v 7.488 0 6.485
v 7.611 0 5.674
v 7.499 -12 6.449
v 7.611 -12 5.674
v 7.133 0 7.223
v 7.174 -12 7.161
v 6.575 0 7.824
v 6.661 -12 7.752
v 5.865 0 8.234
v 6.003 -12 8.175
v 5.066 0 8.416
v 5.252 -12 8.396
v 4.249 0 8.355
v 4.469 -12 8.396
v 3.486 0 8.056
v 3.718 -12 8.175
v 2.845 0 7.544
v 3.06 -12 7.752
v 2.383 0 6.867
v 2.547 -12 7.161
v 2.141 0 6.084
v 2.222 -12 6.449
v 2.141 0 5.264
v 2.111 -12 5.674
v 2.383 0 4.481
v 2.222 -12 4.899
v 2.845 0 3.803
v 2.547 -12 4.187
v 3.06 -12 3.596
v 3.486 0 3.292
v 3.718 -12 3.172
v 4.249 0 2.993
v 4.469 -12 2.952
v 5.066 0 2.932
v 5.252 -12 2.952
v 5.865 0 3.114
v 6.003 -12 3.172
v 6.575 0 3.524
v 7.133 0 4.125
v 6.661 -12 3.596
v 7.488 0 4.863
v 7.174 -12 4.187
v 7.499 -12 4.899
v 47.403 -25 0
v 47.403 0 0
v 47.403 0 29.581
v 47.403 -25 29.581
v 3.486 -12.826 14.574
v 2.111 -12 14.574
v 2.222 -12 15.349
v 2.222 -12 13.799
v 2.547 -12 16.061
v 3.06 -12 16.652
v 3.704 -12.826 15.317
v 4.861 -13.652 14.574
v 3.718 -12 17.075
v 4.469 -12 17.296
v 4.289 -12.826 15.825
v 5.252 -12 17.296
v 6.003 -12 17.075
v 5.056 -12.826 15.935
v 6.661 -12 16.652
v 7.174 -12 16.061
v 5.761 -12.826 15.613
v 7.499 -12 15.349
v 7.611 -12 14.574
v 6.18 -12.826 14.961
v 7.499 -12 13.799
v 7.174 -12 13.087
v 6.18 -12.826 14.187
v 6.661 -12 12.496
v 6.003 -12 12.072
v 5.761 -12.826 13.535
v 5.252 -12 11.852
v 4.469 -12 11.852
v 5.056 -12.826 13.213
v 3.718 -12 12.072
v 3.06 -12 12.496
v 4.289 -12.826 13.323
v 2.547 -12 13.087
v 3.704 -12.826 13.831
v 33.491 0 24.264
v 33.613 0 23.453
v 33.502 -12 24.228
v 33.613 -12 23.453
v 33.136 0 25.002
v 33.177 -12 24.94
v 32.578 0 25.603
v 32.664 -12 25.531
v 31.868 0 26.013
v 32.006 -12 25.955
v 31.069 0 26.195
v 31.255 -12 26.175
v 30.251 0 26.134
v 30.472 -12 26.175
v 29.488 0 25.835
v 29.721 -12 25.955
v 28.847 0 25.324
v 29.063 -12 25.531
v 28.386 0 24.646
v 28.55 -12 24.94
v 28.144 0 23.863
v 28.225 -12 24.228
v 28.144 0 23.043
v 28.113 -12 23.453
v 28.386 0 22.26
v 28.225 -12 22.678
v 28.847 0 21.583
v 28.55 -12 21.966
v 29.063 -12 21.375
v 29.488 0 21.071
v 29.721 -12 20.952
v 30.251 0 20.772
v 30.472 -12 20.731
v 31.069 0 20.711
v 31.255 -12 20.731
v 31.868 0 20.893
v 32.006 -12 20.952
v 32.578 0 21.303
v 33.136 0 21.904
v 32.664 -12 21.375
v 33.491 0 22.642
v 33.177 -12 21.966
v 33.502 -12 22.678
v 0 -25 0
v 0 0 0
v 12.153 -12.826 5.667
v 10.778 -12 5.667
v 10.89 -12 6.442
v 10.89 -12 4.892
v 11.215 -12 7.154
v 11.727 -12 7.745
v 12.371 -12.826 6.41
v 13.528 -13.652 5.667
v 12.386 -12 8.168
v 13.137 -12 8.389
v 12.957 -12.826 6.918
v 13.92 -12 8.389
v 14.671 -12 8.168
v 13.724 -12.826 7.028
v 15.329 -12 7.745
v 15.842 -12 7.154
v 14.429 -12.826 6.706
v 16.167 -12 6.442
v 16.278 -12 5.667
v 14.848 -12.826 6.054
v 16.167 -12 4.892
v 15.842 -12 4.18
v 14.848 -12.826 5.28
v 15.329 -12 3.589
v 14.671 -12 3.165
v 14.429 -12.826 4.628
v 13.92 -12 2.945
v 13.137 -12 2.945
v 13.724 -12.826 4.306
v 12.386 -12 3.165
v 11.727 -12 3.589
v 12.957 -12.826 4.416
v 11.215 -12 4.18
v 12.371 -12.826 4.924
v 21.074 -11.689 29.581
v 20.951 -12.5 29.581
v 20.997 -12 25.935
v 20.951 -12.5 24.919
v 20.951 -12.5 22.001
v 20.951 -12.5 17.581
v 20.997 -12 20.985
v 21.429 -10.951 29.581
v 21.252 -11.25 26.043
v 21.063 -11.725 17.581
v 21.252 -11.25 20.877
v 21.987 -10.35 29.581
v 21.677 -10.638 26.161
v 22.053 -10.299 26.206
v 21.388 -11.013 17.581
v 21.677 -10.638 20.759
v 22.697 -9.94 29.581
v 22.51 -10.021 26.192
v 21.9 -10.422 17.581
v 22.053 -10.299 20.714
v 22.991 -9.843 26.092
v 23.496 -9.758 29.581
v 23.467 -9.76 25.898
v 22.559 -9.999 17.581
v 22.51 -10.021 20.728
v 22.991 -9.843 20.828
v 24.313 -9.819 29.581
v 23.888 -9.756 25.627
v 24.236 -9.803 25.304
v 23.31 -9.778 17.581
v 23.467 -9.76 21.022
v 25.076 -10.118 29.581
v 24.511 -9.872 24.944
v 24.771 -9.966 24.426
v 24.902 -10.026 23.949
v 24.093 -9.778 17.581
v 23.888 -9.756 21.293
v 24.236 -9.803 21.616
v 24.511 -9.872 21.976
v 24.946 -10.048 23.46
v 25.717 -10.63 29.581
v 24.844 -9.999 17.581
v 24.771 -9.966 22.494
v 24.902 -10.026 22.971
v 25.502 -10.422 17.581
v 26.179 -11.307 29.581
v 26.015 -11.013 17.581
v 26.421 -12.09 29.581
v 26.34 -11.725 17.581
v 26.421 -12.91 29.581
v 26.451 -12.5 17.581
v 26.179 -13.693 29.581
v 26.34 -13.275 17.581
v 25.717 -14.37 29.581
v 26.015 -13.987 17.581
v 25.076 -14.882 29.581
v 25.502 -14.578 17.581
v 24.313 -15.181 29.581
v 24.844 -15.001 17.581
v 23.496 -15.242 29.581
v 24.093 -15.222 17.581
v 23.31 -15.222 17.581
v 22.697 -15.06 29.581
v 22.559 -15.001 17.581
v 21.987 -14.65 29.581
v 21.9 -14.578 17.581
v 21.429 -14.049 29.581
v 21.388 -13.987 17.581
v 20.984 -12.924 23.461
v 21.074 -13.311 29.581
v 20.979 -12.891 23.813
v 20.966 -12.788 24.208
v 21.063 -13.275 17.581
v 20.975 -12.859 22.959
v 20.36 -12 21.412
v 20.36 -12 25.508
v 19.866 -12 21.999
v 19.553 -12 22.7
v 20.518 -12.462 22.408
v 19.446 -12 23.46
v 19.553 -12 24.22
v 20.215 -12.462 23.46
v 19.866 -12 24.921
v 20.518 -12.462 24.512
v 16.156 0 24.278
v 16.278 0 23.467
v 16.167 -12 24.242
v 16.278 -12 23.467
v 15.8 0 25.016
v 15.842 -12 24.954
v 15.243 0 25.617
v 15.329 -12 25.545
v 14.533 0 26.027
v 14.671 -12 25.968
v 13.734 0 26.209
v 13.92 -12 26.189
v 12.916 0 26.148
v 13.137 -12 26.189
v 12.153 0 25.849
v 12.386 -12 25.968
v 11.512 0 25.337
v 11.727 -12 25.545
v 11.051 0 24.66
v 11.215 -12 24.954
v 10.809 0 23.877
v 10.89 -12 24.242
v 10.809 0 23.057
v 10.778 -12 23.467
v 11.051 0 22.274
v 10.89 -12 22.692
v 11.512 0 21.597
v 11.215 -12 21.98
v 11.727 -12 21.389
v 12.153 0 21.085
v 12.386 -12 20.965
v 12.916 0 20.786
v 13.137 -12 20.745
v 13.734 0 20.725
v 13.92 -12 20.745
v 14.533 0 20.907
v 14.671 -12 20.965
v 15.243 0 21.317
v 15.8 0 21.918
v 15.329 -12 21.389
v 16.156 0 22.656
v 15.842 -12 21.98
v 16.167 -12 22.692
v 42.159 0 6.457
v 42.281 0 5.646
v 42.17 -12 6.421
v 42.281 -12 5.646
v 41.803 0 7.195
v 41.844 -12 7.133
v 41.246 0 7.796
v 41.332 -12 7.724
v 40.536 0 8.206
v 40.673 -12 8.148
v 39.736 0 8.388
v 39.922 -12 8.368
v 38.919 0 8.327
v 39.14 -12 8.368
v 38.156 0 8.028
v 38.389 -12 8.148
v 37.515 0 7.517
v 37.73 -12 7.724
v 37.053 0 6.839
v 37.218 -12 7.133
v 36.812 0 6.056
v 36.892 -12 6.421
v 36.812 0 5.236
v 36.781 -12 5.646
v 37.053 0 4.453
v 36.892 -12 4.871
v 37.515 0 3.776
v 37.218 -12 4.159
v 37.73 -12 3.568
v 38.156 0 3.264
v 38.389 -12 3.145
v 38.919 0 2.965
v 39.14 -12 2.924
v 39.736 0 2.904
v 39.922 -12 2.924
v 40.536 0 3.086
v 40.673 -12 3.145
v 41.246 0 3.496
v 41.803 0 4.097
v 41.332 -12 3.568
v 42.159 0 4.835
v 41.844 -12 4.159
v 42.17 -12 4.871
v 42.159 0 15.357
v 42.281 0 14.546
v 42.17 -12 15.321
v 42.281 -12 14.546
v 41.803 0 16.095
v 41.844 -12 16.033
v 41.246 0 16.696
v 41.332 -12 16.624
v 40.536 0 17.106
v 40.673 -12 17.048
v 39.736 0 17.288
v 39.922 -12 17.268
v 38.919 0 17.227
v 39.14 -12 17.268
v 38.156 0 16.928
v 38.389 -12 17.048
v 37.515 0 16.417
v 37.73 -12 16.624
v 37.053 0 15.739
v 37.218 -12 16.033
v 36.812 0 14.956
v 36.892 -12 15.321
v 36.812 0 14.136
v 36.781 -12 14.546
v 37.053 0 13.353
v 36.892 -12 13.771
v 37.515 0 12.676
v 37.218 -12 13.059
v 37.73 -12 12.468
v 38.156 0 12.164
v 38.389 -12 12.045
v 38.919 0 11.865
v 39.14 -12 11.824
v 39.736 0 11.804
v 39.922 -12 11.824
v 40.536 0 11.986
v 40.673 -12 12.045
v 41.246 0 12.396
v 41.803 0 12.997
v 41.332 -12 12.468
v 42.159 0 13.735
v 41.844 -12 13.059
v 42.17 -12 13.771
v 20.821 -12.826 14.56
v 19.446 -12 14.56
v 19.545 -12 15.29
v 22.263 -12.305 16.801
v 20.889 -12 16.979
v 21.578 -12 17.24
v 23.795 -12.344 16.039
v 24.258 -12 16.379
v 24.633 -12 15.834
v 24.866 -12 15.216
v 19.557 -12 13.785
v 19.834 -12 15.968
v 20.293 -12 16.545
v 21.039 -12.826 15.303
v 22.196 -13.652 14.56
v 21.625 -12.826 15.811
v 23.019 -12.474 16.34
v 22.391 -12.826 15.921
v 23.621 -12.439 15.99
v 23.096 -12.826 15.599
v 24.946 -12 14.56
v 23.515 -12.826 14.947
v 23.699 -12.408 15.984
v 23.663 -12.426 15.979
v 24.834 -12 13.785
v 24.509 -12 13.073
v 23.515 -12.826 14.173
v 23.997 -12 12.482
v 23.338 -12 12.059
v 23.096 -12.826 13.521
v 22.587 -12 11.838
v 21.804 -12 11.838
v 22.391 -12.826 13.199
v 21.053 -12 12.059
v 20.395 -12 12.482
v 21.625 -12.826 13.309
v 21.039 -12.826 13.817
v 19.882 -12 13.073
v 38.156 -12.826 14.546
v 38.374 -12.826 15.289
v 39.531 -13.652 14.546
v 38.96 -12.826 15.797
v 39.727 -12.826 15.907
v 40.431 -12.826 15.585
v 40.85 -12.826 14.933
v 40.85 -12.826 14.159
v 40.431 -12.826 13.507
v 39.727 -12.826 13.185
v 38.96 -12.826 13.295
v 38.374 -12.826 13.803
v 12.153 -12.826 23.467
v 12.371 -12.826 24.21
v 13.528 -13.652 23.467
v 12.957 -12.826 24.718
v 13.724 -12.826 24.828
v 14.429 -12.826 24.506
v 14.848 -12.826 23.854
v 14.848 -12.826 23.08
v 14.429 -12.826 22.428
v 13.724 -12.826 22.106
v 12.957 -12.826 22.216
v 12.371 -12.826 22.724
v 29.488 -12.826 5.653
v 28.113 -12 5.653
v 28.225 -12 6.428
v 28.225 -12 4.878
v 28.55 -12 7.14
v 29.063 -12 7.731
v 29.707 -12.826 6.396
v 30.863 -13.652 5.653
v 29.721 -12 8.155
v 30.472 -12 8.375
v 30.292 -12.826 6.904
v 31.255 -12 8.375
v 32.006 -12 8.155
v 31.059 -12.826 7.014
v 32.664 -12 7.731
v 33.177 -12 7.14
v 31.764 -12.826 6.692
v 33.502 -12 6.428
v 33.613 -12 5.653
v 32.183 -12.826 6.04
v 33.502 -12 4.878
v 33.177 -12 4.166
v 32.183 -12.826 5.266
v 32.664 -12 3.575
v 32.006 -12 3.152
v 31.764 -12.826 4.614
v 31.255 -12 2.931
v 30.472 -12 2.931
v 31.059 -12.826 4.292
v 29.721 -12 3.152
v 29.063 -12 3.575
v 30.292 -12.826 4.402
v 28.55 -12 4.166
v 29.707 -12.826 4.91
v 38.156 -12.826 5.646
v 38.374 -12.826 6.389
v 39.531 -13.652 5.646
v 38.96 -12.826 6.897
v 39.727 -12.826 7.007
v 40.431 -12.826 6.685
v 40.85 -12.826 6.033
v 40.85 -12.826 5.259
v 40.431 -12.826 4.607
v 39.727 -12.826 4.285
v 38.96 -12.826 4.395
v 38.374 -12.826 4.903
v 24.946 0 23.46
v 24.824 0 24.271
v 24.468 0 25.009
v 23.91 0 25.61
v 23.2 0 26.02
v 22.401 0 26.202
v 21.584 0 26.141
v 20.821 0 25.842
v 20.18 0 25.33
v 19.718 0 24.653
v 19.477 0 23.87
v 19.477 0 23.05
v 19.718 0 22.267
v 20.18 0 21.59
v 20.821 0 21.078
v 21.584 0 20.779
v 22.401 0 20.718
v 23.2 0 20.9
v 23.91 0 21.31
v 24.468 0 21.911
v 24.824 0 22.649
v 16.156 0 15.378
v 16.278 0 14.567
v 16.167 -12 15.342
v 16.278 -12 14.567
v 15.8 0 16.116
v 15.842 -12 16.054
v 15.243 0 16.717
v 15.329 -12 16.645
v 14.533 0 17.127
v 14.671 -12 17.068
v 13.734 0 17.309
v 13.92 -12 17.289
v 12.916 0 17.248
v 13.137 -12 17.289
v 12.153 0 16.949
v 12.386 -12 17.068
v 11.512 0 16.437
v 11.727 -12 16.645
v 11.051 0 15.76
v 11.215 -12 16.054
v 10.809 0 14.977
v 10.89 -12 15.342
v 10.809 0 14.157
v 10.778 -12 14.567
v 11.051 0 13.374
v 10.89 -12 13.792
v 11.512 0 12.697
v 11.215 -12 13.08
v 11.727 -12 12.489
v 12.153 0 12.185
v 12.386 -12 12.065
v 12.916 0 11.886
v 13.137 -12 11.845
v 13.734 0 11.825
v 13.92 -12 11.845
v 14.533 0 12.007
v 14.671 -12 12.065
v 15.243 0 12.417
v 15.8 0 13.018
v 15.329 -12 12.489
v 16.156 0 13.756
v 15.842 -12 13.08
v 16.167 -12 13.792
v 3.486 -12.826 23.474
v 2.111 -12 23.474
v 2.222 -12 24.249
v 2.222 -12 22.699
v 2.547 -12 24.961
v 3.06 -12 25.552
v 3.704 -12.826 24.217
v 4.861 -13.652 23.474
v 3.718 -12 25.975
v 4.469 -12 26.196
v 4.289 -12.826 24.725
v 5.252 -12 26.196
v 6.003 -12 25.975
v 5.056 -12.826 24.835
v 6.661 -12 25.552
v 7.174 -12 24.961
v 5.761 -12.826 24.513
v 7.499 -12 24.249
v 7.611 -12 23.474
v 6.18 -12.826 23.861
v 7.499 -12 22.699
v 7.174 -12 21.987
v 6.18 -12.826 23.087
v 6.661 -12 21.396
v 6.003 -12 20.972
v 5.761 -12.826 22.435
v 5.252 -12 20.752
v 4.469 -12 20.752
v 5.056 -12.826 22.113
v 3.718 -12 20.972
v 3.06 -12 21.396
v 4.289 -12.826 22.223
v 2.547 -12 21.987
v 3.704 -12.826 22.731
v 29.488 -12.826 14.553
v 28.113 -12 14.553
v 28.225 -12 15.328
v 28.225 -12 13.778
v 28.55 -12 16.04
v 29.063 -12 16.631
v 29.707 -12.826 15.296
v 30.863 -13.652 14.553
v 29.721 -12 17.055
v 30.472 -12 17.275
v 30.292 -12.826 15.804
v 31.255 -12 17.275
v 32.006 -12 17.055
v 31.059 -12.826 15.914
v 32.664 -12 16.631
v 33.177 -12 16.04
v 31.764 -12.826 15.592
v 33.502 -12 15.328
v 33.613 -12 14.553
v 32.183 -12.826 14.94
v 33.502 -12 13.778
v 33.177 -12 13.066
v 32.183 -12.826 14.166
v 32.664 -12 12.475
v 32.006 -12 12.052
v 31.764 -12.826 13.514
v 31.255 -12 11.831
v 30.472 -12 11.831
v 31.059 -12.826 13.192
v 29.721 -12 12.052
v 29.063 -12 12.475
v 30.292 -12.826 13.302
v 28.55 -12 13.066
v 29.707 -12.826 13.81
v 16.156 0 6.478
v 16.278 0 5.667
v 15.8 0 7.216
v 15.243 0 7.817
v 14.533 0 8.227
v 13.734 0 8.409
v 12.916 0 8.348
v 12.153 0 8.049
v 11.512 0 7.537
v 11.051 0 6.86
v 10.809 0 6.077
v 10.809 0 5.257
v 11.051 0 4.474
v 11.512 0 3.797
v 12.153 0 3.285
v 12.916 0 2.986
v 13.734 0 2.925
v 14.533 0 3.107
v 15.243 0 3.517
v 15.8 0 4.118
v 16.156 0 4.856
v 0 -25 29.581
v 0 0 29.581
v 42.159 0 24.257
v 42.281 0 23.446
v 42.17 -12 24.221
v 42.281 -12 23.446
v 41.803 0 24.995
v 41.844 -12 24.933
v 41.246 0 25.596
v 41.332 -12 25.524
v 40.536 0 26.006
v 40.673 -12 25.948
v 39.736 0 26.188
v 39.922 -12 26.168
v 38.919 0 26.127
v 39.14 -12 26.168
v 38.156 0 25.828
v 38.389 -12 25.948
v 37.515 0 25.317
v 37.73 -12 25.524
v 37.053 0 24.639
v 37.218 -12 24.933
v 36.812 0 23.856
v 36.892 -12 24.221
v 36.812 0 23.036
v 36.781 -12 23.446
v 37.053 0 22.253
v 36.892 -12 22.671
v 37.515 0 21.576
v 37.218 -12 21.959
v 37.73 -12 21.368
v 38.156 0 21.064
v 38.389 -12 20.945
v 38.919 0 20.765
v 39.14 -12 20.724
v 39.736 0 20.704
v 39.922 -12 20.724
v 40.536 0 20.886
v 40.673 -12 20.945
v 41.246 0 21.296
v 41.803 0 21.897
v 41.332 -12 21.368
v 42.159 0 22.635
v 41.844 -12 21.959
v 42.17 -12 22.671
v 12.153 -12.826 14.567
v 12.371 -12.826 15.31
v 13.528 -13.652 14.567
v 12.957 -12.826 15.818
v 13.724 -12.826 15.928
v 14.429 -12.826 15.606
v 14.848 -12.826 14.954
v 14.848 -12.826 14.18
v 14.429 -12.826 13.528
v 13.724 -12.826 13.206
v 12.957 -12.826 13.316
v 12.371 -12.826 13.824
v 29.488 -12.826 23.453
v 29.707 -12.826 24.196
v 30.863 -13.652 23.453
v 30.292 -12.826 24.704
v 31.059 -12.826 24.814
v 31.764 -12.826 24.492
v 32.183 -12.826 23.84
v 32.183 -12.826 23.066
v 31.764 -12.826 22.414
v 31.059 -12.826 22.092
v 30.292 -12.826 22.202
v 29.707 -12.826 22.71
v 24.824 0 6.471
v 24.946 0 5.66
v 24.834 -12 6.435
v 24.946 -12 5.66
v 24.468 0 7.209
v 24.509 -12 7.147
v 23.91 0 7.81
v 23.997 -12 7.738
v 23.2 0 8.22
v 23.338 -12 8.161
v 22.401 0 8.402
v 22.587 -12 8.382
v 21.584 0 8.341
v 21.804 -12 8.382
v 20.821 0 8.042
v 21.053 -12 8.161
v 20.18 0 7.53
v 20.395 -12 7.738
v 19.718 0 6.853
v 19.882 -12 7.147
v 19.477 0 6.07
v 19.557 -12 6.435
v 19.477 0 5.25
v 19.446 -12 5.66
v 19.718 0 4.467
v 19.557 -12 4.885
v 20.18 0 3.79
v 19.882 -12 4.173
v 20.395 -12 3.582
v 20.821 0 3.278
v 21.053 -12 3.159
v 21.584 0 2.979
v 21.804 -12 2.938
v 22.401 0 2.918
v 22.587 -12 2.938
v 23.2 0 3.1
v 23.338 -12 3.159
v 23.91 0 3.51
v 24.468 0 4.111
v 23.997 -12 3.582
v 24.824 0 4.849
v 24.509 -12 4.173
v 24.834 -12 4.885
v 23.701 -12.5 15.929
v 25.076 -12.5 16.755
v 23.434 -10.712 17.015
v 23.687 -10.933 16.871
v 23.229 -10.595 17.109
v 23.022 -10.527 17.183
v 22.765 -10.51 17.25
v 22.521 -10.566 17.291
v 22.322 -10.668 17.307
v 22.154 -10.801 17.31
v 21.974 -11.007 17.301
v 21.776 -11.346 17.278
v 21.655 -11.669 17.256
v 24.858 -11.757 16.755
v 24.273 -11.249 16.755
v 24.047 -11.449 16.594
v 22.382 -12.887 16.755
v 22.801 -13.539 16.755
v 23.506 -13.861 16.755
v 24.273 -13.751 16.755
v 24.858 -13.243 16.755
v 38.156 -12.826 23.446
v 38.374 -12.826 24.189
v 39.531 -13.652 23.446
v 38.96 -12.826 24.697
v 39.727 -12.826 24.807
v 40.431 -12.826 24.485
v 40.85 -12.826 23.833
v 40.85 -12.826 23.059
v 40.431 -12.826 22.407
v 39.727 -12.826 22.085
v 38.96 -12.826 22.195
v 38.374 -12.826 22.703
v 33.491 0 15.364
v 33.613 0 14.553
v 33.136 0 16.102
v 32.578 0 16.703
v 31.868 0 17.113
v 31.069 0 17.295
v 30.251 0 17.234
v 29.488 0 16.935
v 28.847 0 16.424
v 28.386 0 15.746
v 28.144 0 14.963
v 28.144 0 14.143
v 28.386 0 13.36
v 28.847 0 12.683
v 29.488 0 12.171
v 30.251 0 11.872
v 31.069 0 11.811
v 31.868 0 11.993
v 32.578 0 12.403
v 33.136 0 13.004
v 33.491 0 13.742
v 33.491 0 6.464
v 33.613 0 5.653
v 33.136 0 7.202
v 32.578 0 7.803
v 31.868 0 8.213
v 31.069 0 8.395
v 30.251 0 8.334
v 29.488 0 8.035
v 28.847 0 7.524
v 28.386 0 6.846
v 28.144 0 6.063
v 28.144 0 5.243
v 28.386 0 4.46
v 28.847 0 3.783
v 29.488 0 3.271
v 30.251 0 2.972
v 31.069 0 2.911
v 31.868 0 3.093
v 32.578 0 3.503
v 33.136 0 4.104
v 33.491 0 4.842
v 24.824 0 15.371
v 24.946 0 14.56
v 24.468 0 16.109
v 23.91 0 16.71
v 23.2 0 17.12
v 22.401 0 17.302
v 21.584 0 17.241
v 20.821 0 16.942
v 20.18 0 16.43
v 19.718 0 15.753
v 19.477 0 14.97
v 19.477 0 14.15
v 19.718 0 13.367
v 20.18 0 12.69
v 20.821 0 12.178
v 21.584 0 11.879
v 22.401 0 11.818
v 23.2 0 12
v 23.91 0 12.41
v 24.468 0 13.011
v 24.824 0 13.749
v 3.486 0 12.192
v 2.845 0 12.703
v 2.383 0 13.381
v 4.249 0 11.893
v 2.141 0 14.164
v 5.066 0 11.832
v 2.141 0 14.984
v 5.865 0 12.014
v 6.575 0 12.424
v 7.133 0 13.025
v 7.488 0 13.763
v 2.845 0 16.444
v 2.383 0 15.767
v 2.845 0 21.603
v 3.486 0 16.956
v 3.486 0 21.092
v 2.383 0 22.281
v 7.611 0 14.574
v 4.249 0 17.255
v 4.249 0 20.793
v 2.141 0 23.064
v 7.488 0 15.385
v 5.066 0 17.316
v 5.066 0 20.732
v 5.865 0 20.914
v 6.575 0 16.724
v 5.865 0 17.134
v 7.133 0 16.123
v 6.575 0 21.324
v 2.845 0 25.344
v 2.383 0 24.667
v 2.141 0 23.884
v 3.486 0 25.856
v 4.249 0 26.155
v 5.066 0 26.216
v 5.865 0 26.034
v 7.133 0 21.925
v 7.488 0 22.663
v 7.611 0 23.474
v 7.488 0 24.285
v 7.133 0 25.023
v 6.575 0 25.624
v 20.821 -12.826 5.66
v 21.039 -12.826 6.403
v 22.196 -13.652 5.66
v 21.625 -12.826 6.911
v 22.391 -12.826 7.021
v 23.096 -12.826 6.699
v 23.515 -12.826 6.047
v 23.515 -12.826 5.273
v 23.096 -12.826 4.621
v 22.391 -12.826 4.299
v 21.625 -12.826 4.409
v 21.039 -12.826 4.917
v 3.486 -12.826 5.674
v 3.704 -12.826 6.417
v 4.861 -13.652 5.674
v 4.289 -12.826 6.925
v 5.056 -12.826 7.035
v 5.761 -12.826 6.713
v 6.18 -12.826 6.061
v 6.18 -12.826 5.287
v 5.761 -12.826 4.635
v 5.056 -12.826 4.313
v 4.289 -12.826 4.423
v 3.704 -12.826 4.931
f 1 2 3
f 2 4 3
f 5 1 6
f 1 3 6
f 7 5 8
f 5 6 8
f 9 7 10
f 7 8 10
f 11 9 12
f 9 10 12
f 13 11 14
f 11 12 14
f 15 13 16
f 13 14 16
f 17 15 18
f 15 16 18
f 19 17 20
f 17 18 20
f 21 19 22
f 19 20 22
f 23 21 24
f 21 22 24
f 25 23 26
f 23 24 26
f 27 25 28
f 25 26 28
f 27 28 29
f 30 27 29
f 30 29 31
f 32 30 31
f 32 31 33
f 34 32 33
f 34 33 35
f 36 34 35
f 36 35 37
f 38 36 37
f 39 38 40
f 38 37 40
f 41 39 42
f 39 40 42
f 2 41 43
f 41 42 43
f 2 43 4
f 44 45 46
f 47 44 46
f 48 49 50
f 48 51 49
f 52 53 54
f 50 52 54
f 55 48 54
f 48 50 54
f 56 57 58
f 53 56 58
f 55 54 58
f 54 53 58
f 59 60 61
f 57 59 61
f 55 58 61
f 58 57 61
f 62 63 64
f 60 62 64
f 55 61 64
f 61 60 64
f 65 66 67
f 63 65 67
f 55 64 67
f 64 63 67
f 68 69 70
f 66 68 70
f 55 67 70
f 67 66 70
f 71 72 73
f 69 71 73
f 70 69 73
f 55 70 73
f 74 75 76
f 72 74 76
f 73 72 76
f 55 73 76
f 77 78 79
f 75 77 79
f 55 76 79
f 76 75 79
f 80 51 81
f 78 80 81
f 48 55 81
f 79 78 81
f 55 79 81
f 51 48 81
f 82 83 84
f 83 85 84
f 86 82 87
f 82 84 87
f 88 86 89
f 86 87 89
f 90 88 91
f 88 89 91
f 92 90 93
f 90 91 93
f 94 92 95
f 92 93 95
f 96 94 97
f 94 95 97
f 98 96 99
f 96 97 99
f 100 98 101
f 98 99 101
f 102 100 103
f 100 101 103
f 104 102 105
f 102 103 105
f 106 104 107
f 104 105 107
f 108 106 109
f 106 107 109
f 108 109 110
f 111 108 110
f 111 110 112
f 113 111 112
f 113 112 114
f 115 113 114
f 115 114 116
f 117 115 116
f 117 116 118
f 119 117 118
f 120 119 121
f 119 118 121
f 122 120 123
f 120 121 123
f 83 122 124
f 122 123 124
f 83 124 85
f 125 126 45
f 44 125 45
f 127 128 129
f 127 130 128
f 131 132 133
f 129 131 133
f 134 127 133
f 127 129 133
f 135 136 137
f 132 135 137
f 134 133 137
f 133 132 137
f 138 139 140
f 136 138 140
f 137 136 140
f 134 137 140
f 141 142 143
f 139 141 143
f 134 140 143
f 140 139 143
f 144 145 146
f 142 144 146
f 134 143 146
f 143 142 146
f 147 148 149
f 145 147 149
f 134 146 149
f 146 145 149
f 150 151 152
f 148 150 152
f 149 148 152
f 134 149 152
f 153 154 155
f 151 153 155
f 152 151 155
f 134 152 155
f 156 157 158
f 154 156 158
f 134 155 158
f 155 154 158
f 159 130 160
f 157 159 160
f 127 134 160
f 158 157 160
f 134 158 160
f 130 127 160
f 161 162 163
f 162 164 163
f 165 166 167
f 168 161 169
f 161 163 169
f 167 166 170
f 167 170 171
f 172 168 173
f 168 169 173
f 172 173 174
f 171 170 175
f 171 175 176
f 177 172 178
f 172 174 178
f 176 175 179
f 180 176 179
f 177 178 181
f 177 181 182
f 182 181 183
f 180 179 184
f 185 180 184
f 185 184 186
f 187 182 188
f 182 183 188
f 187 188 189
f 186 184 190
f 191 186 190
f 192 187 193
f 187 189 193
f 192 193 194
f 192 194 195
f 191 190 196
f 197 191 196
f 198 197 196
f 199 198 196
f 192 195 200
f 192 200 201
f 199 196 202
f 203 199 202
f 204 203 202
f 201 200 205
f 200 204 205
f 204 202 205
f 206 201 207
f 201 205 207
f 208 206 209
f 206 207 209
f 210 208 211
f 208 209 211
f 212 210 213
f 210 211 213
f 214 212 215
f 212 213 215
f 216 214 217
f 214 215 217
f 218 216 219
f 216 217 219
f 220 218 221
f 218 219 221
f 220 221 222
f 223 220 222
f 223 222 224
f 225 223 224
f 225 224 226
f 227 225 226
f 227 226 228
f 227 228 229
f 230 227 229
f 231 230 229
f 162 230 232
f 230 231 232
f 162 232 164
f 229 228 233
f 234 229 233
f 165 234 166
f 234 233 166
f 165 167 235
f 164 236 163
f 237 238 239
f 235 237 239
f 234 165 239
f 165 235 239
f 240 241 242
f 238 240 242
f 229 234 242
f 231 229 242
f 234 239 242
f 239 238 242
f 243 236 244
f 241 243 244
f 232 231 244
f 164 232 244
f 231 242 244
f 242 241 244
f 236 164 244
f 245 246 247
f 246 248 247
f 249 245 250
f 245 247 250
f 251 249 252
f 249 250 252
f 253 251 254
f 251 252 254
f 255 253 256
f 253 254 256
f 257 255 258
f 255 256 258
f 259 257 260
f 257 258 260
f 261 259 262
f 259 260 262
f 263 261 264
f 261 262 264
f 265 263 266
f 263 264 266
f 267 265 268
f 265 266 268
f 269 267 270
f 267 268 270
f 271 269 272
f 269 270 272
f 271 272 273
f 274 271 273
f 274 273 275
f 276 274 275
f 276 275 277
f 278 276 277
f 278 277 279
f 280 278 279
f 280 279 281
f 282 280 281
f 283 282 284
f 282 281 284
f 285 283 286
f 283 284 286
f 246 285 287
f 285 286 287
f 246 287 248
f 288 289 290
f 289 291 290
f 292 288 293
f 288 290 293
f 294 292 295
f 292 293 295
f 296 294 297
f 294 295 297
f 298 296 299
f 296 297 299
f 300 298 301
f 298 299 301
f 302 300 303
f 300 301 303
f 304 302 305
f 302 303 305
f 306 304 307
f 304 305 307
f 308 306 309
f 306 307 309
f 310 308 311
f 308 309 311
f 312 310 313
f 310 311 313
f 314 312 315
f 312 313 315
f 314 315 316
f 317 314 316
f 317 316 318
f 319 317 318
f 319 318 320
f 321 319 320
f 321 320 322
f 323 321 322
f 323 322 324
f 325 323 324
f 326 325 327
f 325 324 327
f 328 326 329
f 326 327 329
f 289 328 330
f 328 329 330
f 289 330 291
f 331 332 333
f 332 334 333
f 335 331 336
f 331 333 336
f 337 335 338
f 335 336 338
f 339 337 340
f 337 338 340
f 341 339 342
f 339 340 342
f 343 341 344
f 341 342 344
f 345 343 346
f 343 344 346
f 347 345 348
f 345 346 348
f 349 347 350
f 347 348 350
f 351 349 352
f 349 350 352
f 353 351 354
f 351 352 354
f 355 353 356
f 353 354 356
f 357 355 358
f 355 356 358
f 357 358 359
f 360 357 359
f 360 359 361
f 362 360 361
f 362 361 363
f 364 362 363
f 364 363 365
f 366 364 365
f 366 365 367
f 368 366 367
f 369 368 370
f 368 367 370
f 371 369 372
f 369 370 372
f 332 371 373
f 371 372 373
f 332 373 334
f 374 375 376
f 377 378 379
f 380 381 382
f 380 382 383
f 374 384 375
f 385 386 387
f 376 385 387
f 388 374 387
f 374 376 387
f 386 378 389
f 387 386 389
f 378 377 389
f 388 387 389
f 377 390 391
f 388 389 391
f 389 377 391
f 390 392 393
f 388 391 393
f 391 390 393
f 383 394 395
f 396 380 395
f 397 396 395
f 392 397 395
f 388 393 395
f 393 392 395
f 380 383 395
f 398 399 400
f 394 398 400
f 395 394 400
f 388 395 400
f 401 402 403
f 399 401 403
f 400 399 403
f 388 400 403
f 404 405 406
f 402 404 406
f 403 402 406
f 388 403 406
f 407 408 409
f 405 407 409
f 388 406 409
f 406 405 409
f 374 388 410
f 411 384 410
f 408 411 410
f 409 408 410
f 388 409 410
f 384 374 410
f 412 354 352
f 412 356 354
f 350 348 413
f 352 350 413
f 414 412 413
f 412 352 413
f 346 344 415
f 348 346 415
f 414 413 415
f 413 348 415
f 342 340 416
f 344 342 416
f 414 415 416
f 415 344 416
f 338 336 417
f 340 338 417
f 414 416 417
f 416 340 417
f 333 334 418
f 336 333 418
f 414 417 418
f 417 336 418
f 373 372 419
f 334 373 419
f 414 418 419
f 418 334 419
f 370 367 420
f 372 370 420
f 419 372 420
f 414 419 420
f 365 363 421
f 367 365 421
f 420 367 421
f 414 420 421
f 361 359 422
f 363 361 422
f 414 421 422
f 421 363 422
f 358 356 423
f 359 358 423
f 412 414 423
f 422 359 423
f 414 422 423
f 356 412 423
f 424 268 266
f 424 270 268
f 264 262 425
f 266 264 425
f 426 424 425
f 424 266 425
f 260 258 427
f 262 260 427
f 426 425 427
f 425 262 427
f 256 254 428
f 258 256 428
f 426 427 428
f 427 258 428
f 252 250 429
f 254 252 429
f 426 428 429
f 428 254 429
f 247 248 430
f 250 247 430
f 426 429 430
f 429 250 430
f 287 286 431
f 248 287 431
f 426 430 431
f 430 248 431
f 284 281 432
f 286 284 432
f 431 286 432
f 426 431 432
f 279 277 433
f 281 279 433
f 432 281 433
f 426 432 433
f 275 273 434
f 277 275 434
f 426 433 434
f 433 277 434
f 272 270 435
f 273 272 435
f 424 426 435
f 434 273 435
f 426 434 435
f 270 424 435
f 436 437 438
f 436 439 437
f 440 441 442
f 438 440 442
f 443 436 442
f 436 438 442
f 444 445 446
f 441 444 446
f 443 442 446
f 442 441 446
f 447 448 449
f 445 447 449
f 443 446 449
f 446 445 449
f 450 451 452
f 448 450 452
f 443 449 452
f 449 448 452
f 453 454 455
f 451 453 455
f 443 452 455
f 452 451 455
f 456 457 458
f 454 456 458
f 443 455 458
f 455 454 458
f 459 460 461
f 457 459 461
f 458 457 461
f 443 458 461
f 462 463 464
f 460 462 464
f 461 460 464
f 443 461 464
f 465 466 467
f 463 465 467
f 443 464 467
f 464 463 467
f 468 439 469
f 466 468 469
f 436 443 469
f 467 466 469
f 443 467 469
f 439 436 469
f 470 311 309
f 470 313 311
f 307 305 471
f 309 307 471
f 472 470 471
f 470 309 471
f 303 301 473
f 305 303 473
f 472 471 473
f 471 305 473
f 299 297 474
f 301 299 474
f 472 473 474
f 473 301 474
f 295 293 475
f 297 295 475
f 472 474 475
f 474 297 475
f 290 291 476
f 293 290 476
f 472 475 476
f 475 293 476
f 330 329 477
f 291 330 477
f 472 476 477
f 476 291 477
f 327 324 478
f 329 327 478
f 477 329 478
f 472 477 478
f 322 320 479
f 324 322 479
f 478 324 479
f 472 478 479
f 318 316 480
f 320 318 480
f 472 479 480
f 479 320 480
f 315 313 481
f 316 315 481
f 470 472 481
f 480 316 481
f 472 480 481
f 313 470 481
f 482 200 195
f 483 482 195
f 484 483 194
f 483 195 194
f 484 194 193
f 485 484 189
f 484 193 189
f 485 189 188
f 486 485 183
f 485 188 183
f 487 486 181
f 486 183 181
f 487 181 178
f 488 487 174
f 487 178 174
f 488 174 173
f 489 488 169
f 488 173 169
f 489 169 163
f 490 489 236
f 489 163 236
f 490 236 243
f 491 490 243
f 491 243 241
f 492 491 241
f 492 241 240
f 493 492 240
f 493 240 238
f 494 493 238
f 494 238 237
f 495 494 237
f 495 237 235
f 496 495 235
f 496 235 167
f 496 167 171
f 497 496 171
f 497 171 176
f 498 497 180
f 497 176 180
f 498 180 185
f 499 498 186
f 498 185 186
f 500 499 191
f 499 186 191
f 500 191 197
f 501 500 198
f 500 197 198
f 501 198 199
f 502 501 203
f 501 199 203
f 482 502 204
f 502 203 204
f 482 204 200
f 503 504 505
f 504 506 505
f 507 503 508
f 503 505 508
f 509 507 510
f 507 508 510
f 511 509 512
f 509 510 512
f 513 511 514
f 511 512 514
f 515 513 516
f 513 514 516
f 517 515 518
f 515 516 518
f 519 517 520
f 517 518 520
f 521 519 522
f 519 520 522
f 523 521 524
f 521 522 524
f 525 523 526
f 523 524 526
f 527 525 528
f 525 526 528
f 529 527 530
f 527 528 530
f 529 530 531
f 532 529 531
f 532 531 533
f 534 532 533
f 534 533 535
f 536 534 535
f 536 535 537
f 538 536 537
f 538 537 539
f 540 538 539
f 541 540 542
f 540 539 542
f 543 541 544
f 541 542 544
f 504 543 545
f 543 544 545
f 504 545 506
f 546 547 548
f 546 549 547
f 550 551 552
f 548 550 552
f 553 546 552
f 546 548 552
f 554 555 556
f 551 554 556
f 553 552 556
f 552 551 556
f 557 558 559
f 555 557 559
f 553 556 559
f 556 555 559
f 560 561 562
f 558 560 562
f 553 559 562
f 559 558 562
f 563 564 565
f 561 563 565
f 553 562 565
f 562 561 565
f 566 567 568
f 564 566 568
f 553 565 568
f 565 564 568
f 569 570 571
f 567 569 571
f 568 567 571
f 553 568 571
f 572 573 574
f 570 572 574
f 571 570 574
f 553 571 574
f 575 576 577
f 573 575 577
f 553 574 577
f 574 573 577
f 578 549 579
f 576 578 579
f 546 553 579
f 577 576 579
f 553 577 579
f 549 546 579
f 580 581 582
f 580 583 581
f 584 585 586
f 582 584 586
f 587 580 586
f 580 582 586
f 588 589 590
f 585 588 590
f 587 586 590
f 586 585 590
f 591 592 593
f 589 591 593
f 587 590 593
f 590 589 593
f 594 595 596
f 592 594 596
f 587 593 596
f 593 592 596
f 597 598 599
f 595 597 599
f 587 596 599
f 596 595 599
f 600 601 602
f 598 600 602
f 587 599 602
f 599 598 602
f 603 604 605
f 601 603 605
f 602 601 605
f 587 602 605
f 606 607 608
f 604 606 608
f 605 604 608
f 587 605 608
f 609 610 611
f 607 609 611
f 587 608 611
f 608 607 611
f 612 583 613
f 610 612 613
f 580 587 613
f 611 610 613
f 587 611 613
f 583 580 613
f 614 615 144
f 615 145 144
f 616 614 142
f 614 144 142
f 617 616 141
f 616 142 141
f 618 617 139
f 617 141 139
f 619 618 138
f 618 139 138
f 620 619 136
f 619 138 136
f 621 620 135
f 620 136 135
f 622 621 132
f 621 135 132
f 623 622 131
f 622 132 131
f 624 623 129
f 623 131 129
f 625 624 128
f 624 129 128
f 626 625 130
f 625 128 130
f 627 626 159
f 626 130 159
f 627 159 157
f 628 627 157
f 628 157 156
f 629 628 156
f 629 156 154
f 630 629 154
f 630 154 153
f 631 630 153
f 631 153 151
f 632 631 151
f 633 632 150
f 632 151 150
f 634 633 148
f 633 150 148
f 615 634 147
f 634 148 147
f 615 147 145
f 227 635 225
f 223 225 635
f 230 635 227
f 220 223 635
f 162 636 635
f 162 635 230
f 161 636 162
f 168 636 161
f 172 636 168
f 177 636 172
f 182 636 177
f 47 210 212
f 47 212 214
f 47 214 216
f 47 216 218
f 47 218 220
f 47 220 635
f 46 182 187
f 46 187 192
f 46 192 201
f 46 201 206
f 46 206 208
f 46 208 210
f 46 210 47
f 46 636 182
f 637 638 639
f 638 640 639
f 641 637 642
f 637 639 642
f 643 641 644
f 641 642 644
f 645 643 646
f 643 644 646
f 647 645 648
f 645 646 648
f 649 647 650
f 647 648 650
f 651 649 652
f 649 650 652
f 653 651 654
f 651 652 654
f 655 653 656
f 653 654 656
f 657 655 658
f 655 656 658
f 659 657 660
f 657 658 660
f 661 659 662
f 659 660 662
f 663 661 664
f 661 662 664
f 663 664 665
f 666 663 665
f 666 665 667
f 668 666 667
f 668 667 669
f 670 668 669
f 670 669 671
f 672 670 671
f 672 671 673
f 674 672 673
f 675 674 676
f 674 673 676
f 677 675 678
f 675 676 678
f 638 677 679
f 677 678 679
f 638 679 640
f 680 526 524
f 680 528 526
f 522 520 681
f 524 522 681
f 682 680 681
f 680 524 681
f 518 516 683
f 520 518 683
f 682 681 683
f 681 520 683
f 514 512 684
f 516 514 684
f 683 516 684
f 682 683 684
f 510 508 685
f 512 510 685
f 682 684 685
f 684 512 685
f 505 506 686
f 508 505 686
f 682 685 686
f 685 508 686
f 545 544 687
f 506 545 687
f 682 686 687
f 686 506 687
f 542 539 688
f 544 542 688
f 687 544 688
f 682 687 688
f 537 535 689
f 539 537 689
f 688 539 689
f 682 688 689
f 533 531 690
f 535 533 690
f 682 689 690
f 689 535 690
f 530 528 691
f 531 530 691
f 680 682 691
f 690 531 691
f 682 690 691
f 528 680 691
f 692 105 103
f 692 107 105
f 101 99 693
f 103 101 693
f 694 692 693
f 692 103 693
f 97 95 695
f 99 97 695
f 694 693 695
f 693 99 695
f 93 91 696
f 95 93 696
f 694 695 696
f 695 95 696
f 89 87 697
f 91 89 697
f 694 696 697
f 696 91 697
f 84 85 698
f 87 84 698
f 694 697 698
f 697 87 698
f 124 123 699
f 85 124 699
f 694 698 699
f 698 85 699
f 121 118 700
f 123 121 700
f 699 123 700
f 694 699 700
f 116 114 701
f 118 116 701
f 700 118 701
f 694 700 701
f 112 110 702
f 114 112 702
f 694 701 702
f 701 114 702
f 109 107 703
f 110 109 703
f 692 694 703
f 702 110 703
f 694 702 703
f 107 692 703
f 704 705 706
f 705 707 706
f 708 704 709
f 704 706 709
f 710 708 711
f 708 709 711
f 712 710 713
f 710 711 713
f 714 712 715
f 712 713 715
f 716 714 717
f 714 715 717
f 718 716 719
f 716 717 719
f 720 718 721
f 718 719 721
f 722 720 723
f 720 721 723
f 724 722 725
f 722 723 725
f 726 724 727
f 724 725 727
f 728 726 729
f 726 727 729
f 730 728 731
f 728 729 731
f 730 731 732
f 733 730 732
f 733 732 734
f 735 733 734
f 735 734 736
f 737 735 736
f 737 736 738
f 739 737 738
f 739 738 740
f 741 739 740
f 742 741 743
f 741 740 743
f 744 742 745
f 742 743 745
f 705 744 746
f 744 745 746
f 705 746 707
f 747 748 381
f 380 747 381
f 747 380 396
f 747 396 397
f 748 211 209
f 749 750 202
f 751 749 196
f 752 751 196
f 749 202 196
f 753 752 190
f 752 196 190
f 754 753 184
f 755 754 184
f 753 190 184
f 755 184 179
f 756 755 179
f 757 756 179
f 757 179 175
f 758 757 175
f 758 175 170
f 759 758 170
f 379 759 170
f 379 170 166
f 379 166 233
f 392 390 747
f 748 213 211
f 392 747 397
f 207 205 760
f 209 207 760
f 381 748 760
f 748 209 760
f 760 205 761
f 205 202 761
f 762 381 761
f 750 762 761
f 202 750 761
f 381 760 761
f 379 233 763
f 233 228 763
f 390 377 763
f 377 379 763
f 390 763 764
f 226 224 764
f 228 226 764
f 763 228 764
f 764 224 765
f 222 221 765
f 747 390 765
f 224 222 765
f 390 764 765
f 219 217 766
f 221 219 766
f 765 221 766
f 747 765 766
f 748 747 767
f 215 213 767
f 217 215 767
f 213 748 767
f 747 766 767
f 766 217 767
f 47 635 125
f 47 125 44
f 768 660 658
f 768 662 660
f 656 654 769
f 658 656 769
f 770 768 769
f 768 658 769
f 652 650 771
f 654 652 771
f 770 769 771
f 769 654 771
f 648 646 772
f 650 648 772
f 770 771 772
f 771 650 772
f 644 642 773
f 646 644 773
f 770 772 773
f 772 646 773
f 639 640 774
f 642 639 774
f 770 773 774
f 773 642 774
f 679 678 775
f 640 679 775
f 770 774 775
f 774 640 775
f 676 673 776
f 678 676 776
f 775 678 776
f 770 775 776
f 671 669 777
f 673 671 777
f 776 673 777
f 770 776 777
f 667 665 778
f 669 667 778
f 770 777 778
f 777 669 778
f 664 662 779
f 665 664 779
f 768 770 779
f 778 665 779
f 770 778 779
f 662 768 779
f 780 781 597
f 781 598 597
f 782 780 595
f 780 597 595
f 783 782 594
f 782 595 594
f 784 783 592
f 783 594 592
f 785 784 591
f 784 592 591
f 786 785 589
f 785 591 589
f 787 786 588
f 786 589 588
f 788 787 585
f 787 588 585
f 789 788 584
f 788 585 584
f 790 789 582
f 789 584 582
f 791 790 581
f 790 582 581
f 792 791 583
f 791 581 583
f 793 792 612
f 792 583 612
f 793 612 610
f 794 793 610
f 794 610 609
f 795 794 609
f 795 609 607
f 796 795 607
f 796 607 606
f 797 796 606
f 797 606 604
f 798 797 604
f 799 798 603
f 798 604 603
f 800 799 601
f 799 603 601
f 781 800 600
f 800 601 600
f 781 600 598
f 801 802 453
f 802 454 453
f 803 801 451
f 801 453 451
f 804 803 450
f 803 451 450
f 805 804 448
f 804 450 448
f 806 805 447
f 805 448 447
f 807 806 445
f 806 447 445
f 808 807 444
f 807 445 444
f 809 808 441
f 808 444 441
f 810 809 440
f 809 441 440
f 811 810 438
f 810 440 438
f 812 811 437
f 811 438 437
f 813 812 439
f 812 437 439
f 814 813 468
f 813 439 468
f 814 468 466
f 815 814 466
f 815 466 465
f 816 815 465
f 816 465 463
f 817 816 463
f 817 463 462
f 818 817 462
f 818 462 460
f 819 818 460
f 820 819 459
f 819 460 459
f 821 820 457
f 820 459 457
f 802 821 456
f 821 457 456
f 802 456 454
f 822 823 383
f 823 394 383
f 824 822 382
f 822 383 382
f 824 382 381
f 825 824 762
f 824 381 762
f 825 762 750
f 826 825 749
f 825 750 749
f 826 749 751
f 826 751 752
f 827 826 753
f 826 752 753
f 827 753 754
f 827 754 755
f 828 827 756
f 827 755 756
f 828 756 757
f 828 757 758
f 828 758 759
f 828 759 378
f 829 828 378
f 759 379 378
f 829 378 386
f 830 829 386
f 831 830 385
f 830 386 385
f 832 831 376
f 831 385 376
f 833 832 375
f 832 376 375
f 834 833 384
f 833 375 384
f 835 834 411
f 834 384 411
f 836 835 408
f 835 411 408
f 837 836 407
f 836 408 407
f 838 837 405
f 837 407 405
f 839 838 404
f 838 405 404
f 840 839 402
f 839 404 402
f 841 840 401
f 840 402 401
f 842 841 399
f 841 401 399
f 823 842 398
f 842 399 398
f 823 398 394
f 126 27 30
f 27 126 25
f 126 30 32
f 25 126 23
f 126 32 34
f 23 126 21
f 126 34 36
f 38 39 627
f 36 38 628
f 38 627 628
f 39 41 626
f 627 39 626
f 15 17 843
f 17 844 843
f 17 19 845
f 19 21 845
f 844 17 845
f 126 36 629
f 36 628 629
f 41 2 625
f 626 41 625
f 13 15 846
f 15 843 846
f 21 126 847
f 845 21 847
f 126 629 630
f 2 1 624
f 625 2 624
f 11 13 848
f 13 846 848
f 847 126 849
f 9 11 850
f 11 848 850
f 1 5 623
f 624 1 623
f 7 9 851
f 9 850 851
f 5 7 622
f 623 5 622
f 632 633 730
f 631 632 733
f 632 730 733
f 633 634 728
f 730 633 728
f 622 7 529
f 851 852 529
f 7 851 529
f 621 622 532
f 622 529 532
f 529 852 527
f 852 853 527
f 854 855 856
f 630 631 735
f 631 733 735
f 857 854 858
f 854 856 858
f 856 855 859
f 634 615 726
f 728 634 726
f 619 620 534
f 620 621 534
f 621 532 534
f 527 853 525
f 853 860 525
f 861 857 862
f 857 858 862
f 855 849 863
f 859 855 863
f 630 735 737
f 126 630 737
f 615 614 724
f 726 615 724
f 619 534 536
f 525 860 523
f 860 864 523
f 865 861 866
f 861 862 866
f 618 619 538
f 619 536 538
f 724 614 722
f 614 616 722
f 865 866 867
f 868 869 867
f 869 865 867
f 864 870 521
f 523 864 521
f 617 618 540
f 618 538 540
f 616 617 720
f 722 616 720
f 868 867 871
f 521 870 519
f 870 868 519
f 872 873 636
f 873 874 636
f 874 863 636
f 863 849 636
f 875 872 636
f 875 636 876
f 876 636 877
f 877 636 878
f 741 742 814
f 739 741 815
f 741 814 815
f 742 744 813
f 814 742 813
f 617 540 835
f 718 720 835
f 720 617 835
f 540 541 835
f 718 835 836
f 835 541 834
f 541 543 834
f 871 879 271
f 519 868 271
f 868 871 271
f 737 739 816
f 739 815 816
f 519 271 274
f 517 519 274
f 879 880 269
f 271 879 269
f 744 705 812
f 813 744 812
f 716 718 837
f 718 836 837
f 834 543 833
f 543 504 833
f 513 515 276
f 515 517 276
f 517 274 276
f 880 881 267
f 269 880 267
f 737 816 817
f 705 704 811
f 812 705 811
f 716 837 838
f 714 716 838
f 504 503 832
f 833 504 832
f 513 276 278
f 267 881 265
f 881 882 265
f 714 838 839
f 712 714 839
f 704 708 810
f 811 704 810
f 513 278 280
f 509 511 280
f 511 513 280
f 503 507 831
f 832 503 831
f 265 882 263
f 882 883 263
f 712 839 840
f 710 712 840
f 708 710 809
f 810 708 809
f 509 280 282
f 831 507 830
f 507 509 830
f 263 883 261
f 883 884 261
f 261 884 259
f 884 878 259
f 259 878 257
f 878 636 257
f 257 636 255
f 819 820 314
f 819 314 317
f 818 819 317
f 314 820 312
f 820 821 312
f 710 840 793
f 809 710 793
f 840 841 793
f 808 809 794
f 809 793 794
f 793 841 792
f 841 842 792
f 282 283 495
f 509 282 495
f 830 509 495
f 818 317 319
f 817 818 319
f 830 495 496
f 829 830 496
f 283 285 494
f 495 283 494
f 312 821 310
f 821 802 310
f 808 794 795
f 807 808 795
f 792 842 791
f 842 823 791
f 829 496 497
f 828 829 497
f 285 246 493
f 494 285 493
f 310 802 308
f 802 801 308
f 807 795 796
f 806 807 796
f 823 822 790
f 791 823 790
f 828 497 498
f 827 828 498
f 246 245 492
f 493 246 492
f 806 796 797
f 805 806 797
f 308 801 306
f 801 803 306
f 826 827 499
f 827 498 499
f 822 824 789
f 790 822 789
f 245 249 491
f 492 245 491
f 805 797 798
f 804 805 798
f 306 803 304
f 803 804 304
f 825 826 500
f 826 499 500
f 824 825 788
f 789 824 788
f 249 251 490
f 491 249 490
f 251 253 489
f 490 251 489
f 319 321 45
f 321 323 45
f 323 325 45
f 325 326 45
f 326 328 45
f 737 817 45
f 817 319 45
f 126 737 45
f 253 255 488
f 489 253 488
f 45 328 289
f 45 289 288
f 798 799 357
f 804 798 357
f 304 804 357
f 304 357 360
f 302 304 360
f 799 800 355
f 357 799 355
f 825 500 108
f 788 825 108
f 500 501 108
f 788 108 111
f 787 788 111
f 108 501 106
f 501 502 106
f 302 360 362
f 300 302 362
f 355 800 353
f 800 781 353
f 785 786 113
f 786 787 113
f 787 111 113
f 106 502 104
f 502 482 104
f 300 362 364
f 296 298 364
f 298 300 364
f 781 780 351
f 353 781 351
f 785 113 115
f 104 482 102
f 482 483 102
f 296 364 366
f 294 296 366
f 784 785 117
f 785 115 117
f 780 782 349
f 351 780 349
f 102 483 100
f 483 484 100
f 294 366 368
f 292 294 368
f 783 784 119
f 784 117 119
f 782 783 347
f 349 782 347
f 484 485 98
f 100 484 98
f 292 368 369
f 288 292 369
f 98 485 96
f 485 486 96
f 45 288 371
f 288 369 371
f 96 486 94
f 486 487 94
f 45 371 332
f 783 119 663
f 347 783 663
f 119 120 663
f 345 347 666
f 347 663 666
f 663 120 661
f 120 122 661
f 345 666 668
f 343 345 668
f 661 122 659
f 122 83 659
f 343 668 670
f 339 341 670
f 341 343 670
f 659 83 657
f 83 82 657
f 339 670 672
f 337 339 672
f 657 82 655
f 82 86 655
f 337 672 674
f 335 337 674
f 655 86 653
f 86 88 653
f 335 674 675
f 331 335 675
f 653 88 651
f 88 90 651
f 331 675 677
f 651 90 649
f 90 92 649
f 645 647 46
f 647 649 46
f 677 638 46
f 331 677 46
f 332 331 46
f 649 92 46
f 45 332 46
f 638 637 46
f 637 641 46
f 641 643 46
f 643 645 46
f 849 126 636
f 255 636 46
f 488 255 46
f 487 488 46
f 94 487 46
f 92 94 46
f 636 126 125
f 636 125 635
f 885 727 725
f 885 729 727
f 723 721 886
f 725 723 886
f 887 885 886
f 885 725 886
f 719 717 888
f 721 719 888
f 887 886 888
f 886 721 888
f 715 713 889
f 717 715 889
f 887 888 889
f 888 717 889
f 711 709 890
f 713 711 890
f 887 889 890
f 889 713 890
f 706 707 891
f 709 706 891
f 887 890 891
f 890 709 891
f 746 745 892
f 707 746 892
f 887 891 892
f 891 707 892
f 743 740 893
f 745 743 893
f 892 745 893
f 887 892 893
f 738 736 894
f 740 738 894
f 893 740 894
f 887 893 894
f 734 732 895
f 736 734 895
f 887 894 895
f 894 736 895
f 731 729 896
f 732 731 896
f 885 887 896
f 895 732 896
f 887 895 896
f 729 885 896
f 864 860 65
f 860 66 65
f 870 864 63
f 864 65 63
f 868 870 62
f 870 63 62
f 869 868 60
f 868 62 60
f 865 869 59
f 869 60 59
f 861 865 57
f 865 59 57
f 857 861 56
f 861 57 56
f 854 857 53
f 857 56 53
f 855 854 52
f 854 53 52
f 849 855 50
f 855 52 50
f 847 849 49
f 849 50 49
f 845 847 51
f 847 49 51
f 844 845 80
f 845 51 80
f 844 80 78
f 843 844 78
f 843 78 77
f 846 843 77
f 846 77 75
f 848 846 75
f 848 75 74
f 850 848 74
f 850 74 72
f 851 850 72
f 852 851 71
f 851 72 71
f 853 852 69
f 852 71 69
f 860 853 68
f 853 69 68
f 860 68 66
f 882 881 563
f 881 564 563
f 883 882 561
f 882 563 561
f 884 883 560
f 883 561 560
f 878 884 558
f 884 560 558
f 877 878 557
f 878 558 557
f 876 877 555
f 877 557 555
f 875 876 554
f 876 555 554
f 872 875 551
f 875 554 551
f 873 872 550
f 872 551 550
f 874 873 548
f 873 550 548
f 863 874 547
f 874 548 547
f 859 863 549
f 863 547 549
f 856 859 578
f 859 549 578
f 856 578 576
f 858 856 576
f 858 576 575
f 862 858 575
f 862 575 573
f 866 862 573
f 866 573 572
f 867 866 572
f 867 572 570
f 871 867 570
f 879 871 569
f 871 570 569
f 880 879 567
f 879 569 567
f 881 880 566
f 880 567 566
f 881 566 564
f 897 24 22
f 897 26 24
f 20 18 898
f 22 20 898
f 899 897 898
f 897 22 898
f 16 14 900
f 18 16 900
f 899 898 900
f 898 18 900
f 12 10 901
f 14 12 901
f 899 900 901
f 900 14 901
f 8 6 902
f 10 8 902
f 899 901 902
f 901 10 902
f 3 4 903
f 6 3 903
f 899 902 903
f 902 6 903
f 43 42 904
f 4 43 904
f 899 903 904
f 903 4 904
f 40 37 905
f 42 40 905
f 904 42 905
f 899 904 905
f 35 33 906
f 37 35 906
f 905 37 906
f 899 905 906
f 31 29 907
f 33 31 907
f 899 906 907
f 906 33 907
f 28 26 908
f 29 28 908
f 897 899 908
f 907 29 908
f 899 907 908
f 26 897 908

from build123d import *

# Parameters (mm, degrees)
F0_W     = 47.4027246237
F0_H     = 29.581496492
F1_DEPTH = 25
F3_D     = 5.5
F3_DEPTH = 12
F3_TIP   = 1.6523667023
F5_D     = 5.5
F5_DEPTH = 12
F5_TIP   = 1.6523667023


with BuildPart() as f1:
    # F0 (on Front) → F1 (new body)
    with BuildSketch(Plane.XZ):
        with Locations((23.7013623118, 14.790748246)):
            Rectangle(F0_W, F0_H)
    extrude(amount=F1_DEPTH)

    # F3
    with Locations(Plane.XY.offset(29.581496492)):
        with Locations((23.7013623118, -12.5)):
            Hole(F3_D / 2, depth=F3_DEPTH)
            with Locations((0, 0, -(F3_DEPTH + F3_TIP / 2))):  # 118° drill point
                Cone(0, F3_D / 2, F3_TIP, mode=Mode.SUBTRACT)

    # F5
    with Locations(Plane(origin=(0, 0, 0), x_dir=(-1, 0, 0), z_dir=(0, 1, 0))):
        with Locations((-39.530955255, 23.4460607171), (-30.8633740127, 23.4530330807), (-22.1957927704, 23.4600054443), (-13.5282115281, 23.4669778079), (-4.8606302857, 23.4739501715), (-39.530955255, 5.6460607171), (-39.530955255, 14.5460607171), (-4.8606302857, 5.6739501715), (-30.8633740127, 14.5530330807), (-4.8606302857, 14.5739501715), (-30.8633740127, 5.6530330807), (-22.1957927704, 14.5600054443), (-13.5282115281, 14.5669778079), (-22.1957927704, 5.6600054443), (-13.5282115281, 5.6669778079)):
            Hole(F5_D / 2, depth=F5_DEPTH)
            with Locations((0, 0, -(F5_DEPTH + F5_TIP / 2))):  # 118° drill point
                Cone(0, F5_D / 2, F5_TIP, mode=Mode.SUBTRACT)


solid = f1.part
